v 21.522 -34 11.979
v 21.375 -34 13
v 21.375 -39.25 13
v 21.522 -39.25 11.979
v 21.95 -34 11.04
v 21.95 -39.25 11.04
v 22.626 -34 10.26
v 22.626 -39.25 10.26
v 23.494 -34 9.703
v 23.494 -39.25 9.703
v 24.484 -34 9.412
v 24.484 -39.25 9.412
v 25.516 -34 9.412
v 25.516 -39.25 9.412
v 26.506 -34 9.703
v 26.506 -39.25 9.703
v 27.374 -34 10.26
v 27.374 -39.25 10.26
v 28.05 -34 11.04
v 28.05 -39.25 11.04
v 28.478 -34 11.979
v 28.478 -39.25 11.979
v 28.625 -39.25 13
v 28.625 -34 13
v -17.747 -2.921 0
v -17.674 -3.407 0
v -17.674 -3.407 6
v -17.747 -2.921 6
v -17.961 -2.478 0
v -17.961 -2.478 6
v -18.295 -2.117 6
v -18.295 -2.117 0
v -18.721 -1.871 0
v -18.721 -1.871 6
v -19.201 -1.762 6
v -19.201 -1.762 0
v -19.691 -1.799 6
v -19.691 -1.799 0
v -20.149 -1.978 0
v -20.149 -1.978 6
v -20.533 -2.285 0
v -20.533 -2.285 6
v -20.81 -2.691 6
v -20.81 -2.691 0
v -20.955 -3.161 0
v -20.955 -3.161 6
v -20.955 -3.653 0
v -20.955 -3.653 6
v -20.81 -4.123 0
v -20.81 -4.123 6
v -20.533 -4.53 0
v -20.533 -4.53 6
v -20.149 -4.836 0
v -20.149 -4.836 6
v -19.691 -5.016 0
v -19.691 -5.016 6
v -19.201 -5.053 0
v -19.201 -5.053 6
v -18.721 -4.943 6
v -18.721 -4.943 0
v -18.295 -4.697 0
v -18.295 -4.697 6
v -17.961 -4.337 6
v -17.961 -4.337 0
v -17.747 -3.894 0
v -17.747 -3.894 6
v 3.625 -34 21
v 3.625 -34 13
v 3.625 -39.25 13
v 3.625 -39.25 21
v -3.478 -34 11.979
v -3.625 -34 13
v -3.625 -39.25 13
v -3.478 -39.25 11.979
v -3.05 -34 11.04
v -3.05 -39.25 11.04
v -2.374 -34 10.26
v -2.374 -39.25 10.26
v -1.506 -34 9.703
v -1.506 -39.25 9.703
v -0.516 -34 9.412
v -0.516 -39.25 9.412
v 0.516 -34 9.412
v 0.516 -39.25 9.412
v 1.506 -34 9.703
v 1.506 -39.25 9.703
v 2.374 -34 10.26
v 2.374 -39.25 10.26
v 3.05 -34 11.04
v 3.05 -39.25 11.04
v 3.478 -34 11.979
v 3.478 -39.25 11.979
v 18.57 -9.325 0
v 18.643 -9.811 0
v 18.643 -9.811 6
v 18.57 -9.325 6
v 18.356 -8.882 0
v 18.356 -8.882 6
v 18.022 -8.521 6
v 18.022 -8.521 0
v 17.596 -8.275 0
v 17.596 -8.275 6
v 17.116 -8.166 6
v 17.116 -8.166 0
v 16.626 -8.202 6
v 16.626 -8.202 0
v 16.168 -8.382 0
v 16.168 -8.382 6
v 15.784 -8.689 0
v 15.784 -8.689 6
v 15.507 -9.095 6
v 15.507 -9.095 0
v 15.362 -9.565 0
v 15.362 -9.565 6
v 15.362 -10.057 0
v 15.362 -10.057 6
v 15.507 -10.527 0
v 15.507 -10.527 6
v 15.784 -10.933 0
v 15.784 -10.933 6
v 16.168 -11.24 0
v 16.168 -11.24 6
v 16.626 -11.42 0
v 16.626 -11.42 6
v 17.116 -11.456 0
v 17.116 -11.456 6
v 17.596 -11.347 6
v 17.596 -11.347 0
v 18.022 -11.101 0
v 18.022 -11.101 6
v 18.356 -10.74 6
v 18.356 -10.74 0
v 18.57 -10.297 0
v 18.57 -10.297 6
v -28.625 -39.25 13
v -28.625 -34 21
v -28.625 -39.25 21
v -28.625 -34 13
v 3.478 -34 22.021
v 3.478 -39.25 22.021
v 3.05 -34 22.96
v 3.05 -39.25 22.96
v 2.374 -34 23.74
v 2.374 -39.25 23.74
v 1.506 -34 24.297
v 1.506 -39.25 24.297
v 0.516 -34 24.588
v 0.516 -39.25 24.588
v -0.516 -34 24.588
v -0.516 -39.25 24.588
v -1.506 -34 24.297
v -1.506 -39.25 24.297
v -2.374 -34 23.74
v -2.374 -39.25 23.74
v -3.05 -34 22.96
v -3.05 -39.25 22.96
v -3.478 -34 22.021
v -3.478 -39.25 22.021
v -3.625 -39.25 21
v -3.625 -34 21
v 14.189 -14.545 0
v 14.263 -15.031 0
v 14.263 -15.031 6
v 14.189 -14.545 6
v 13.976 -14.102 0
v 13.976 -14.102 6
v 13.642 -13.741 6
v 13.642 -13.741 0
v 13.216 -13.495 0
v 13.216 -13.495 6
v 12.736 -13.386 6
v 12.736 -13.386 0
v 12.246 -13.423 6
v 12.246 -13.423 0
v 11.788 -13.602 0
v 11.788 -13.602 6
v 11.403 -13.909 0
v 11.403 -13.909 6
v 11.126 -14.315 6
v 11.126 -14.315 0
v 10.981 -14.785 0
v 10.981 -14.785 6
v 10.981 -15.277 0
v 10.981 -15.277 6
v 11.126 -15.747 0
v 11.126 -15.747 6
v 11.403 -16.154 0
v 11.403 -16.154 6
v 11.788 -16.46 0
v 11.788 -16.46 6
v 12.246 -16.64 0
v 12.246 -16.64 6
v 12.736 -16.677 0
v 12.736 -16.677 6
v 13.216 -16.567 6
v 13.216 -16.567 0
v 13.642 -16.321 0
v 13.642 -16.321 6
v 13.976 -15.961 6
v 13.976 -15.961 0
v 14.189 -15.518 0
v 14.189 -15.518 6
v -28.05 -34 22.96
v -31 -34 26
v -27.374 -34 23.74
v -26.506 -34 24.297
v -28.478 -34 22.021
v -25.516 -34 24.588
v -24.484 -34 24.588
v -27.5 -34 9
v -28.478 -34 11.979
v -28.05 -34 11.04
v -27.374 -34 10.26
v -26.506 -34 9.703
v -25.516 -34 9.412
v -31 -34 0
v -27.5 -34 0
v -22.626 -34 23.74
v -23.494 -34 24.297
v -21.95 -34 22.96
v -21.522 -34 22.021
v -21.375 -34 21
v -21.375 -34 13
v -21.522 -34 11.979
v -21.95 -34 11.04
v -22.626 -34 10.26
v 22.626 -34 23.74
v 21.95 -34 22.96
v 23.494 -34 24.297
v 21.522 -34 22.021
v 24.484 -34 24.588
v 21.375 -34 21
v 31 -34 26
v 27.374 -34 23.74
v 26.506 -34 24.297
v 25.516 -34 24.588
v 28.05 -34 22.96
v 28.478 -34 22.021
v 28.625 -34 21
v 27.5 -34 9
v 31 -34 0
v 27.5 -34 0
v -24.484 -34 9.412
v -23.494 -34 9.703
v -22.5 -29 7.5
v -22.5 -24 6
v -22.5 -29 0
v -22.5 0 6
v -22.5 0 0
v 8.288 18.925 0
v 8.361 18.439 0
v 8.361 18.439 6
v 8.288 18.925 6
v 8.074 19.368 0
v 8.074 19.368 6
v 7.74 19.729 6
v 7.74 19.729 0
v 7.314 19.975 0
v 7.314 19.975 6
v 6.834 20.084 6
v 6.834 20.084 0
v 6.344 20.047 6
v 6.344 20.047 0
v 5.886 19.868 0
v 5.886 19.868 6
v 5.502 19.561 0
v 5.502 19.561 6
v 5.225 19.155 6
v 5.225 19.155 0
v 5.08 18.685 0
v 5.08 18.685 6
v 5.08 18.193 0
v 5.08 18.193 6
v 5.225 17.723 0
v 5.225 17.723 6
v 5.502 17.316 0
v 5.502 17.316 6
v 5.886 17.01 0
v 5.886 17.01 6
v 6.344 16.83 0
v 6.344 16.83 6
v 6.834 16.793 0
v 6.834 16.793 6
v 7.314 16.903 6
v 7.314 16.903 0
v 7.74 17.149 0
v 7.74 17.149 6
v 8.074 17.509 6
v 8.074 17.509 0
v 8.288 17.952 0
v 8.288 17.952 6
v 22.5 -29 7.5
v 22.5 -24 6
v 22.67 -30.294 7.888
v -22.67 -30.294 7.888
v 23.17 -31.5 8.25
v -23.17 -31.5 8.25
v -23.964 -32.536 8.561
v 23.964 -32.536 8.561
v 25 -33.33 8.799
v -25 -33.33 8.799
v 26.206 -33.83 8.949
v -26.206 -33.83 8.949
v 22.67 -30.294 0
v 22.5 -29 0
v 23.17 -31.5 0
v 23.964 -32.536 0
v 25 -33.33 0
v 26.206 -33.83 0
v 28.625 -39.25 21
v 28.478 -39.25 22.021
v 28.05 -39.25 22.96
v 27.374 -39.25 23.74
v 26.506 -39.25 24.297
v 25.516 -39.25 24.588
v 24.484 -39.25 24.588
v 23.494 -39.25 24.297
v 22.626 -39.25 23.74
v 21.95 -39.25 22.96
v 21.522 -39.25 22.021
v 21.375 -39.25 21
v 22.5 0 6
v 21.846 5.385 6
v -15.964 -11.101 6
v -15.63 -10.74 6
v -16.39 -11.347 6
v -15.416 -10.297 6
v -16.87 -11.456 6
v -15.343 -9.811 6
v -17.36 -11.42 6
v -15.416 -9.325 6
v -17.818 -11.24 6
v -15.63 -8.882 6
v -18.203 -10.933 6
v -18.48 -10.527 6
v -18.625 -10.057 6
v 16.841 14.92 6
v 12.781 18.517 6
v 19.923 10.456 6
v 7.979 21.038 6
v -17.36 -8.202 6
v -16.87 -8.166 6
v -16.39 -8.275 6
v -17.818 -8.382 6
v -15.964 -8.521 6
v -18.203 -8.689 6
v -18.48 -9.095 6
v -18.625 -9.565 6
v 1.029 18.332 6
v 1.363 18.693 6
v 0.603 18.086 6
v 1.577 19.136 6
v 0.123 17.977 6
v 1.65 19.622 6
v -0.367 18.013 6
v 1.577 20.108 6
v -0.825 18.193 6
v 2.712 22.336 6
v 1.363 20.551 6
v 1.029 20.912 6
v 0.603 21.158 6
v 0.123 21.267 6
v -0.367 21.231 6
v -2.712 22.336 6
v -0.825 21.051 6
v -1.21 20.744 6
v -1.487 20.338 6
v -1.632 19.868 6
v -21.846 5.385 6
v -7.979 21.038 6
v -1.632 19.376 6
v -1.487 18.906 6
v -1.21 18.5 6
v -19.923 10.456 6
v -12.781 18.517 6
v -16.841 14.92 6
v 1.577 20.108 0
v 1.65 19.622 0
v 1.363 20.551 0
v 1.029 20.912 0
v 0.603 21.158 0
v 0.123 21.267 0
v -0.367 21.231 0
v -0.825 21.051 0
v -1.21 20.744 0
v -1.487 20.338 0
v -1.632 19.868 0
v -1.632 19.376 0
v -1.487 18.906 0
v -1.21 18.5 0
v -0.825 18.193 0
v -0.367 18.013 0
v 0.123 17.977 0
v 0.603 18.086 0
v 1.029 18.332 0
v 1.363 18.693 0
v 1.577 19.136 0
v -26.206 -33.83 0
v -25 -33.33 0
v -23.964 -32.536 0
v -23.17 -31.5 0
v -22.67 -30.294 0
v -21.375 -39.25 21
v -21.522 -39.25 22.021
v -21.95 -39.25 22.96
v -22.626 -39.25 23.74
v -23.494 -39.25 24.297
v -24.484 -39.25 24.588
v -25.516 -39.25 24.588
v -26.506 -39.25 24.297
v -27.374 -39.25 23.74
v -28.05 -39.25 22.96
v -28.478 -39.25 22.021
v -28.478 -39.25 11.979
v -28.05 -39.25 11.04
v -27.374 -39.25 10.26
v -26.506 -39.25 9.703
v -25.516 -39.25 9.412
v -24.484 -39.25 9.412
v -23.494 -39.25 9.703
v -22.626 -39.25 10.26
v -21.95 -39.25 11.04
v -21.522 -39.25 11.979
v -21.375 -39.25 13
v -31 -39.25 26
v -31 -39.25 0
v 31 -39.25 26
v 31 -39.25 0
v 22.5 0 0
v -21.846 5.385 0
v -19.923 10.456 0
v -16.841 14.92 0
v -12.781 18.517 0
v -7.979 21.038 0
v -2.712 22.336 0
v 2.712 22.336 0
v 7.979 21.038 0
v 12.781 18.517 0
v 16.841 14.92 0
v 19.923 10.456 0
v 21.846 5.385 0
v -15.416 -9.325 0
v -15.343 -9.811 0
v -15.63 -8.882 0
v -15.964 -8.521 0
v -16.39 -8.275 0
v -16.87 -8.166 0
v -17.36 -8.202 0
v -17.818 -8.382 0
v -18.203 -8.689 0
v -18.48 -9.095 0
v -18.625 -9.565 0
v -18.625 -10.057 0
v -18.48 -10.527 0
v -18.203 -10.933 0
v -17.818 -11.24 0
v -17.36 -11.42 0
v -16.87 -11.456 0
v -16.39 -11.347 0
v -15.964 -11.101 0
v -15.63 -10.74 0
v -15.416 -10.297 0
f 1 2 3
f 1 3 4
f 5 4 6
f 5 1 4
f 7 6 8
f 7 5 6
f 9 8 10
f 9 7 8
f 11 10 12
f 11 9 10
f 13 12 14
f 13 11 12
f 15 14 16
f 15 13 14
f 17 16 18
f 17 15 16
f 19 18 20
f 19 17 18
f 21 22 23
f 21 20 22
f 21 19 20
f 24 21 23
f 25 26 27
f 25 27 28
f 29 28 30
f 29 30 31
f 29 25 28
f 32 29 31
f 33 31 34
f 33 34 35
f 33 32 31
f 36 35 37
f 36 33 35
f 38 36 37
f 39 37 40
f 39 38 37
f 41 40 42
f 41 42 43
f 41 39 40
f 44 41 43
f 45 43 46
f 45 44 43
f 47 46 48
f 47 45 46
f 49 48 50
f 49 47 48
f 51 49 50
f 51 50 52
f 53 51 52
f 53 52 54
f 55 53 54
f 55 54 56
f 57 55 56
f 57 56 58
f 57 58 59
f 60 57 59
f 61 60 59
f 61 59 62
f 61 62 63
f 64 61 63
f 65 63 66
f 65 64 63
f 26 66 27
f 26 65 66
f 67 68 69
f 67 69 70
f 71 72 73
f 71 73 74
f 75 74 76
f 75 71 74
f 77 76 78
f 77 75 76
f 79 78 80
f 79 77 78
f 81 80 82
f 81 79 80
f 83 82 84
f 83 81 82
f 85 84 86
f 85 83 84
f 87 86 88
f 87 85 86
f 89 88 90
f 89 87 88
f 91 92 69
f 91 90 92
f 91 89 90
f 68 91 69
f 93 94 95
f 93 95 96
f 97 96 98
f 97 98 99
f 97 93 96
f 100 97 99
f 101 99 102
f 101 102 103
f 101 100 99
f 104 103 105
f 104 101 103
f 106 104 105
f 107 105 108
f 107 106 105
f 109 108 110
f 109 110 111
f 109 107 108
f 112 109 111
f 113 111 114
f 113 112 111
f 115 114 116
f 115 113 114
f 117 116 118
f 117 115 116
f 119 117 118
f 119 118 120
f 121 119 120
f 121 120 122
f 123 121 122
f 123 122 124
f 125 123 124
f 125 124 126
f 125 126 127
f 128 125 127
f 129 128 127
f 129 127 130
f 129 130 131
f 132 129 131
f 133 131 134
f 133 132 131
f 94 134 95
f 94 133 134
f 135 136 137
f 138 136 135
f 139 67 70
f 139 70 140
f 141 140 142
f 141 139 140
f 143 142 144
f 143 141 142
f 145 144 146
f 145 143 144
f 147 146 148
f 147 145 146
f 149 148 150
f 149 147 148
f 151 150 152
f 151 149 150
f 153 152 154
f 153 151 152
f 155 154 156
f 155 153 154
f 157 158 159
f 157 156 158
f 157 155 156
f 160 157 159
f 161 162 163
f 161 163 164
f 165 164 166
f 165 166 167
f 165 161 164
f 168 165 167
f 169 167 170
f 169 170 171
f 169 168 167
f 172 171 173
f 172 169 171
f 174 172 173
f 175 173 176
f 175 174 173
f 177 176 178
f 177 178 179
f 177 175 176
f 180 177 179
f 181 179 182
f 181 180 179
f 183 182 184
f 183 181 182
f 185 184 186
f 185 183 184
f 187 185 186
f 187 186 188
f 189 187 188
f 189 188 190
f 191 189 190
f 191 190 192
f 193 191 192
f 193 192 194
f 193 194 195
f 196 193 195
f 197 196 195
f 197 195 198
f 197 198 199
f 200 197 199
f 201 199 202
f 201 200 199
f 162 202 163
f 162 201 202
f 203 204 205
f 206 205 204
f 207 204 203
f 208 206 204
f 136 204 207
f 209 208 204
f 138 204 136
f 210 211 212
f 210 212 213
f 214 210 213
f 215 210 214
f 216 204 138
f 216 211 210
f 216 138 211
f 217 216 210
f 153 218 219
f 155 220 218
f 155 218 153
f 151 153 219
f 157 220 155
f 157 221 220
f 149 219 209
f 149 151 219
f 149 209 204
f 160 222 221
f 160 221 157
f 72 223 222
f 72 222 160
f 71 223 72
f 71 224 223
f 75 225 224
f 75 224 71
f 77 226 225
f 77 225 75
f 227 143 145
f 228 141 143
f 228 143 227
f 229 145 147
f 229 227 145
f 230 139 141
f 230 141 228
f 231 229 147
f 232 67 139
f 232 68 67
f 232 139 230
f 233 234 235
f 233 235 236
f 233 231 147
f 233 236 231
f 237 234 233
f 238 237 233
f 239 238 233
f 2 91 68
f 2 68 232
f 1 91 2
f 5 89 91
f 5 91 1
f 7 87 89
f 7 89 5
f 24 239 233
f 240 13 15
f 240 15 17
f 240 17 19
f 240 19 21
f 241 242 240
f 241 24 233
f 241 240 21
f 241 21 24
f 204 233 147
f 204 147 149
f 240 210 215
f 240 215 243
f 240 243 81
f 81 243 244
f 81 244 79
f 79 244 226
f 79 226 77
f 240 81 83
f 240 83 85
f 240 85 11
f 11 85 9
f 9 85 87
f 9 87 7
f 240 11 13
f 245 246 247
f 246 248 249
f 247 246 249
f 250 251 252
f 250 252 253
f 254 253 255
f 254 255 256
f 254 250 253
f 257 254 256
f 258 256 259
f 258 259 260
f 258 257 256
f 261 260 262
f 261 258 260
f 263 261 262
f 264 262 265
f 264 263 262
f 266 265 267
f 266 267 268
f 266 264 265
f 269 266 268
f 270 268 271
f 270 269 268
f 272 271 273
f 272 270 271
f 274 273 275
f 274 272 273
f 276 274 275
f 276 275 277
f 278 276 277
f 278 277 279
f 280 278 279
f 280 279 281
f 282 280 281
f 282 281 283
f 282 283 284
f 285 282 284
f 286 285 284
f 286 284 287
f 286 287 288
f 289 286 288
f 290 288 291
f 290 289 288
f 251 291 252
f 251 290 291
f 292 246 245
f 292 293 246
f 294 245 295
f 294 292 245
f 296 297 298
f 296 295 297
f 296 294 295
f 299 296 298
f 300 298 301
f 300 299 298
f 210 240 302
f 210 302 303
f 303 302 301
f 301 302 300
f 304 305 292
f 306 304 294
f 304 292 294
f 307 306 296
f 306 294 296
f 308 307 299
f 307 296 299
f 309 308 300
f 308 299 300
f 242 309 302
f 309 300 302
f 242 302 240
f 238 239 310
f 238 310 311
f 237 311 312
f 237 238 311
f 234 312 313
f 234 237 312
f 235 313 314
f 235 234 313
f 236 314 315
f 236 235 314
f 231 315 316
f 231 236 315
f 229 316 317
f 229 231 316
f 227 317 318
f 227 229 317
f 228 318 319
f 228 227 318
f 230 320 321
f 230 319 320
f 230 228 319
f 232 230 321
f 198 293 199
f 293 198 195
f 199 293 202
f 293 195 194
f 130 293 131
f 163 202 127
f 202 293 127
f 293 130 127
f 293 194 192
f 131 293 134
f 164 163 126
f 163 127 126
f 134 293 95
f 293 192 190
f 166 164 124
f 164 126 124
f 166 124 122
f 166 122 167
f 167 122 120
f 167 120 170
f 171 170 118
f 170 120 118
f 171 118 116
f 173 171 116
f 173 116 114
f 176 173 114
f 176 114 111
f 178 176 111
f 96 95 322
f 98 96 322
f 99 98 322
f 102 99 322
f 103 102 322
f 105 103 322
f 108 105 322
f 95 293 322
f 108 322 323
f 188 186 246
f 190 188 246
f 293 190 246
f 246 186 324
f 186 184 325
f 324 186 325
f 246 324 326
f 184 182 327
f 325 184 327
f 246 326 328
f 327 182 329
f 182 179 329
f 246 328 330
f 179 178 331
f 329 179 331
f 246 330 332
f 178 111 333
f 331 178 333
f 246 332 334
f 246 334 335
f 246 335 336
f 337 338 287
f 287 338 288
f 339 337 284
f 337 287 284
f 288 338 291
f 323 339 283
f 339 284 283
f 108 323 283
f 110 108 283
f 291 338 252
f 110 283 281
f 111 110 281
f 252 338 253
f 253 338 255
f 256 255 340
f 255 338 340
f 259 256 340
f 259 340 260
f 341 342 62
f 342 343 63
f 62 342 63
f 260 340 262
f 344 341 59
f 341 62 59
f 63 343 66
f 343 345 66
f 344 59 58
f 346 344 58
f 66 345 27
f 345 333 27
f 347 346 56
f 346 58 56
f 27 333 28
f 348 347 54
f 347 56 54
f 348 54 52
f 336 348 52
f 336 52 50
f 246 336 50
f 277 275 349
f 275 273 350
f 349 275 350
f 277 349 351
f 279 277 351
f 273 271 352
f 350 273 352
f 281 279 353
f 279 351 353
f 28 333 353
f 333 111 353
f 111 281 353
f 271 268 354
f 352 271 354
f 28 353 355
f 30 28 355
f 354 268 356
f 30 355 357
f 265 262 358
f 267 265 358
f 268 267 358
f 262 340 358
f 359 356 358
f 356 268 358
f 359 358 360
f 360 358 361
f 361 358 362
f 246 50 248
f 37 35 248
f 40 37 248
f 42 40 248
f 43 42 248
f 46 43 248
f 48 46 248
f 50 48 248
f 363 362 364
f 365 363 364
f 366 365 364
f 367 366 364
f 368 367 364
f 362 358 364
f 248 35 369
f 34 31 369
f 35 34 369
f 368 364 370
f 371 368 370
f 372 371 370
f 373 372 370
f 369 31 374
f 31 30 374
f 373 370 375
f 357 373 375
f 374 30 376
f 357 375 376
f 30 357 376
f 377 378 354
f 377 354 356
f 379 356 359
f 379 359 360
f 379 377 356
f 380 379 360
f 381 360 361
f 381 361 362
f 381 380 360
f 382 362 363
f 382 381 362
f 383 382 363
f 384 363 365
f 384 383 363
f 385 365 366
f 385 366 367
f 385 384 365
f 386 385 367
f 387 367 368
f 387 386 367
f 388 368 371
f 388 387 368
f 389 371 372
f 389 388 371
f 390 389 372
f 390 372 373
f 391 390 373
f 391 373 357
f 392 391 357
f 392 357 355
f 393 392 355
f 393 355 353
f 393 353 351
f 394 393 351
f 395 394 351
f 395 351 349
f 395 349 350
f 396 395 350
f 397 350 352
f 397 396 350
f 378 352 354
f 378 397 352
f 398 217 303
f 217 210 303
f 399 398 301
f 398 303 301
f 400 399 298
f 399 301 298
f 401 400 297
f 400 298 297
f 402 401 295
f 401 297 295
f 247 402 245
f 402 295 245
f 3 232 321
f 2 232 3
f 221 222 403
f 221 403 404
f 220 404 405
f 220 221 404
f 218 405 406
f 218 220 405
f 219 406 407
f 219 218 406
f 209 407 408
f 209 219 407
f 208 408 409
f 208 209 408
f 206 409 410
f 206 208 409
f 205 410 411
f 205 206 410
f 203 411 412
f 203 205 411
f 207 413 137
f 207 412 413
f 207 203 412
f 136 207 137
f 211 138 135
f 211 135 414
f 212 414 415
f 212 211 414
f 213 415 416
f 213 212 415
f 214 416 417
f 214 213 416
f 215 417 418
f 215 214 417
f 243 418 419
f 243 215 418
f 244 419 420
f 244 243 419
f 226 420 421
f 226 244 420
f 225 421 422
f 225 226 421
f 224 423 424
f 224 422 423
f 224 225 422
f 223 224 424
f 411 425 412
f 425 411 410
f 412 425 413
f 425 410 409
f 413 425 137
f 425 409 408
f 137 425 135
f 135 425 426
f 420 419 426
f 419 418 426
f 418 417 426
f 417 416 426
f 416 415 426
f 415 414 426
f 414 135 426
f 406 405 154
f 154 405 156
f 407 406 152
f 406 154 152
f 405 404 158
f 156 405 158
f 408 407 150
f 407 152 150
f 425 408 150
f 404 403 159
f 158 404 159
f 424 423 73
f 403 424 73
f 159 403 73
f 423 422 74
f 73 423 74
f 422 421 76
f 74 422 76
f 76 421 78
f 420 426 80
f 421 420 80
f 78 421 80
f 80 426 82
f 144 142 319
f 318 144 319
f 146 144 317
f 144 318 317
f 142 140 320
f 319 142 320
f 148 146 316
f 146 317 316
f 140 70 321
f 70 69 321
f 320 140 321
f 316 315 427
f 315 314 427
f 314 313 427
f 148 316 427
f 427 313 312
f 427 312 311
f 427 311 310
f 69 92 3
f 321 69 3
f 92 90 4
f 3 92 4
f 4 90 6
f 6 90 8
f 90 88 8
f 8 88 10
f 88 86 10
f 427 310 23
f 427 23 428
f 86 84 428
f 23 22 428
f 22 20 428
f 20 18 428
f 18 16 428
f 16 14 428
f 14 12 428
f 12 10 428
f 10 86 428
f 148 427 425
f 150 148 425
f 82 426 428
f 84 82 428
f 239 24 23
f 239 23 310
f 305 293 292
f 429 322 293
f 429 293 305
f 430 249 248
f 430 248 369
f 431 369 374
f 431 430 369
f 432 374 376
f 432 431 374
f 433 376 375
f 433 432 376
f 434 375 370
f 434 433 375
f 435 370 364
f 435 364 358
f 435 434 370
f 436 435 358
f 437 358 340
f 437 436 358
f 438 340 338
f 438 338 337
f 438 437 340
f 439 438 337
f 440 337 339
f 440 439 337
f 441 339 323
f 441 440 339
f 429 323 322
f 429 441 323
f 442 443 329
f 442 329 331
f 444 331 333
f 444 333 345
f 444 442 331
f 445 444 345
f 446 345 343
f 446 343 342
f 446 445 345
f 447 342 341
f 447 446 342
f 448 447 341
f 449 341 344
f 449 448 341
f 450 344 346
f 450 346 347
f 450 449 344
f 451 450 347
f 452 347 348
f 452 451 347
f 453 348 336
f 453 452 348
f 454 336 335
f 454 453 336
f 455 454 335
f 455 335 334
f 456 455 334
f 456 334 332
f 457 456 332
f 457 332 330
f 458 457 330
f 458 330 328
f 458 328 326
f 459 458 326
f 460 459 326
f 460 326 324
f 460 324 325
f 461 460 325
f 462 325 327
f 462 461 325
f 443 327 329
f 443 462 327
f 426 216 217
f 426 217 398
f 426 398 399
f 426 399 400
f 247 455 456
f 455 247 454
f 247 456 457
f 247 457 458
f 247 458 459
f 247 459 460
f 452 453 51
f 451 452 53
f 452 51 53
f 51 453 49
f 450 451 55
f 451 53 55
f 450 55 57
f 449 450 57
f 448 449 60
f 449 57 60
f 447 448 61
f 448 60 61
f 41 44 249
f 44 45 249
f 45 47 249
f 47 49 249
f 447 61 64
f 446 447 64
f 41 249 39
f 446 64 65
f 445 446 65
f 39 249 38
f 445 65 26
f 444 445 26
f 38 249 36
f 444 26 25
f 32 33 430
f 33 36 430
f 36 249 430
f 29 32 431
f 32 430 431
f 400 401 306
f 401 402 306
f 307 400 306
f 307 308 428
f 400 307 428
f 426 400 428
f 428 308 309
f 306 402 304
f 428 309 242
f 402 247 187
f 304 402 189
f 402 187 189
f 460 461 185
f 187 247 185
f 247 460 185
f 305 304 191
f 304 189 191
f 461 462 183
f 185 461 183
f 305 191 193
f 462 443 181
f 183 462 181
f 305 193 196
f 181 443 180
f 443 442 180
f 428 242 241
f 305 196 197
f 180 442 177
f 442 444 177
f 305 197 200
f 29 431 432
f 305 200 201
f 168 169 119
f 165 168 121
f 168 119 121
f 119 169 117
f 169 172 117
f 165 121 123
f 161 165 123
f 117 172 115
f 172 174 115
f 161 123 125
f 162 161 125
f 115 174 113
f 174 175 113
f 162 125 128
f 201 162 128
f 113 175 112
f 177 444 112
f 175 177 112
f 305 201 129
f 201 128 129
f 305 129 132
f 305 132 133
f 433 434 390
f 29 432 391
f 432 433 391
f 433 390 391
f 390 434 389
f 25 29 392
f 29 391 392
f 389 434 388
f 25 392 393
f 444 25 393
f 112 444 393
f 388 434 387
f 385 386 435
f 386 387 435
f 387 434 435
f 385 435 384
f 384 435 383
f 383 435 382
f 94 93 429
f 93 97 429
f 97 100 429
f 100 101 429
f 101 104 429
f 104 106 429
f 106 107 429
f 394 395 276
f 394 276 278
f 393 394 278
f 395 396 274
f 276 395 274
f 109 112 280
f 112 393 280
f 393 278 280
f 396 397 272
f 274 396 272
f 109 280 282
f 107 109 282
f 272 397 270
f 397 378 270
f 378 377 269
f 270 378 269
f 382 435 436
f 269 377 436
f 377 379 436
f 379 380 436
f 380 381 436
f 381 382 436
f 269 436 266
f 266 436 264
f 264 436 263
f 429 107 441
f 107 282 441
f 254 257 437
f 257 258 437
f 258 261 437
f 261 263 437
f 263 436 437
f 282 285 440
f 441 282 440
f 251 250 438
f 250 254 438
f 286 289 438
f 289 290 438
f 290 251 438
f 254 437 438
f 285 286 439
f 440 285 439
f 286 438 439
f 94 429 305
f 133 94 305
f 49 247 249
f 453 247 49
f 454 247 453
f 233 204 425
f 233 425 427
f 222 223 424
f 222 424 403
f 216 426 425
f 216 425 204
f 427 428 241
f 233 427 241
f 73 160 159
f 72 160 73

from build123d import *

# Parameters (mm, degrees)
SKETCH_1_R          = 1.65
EXTRUDE_1_DEPTH     = 6
SKETCH_2_W          = 62
SKETCH_2_H          = 5.25
EXTRUDE_2_DEPTH     = 26
CUT_EXTRUDE_1_DEPTH = 70.492805383
EXTRUDE_3_DEPTH     = 22.5
FILLET_1_R          = 5


with BuildPart() as part:
    # 스케치1 → 보스-돌출1 (new body)
    with BuildSketch(Plane.XY):
        with BuildLine():
            ThreePointArc((-22.5, 0), (0, 22.5), (22.5, 0))
            Line((22.5, 0), (22.5, -34))
            Line((22.5, -34), (-22.5, -34))
            Line((-22.5, -34), (-22.5, 0))
        make_face()
        with Locations((-19.32389773, -3.407324542)):
            Circle(SKETCH_1_R, mode=Mode.SUBTRACT)
        with Locations((16.993150473, -9.811)):
            Circle(SKETCH_1_R, mode=Mode.SUBTRACT)
        with Locations((6.711119252, 18.438648605)):
            Circle(SKETCH_1_R, mode=Mode.SUBTRACT)
        with Locations((0, 19.622)):
            Circle(SKETCH_1_R, mode=Mode.SUBTRACT)
        with Locations((12.612778477, -15.031324063)):
            Circle(SKETCH_1_R, mode=Mode.SUBTRACT)
        with Locations((-16.993150473, -9.811)):
            Circle(SKETCH_1_R, mode=Mode.SUBTRACT)
    extrude(amount=EXTRUDE_1_DEPTH)

    # 스케치2 → 보스-돌출2 (add)
    with BuildSketch(Plane.XY):
        with Locations((0, -36.625)):
            Rectangle(SKETCH_2_W, SKETCH_2_H)
    extrude(amount=EXTRUDE_2_DEPTH)

    # 스케치3 → 컷-돌출1 (cut, through all)
    with BuildSketch(Plane(origin=(0, -34, 0), x_dir=(1, 0, 0), z_dir=(0, 1, 0))):
        with BuildLine():
            Line((-3.625, -21), (-3.625, -13))
            ThreePointArc((-3.625, -13), (0, -9.375), (3.625, -13))
            Line((3.625, -13), (3.625, -21))
            ThreePointArc((3.625, -21), (0, -24.625), (-3.625, -21))
        make_face()
        with BuildLine():
            Line((21.375, -21), (21.375, -13))
            ThreePointArc((21.375, -13), (25, -9.375), (28.625, -13))
            Line((28.625, -13), (28.625, -21))
            ThreePointArc((28.625, -21), (25, -24.625), (21.375, -21))
        make_face()
        with BuildLine():
            Line((-28.625, -21), (-28.625, -13))
            ThreePointArc((-28.625, -13), (-25, -9.375), (-21.375, -13))
            Line((-21.375, -13), (-21.375, -21))
            ThreePointArc((-21.375, -21), (-25, -24.625), (-28.625, -21))
        make_face()
    extrude(amount=-CUT_EXTRUDE_1_DEPTH, mode=Mode.SUBTRACT)

    # 스케치4 → 보스-돌출3 (add, symmetric)
    with BuildSketch(Plane(origin=(0, 0, 0), x_dir=(0, 0, -1), z_dir=(1, 0, 0))):
        Polygon((-6, -24), (-9, -34), (-6, -34), align=None)
    extrude(amount=EXTRUDE_3_DEPTH, both=True)

    # 필렛1
    fillet_1_edges = [part.edges().sort_by_distance(p)[0] for p in [
        (22.5, -34, 4.5),
        (-22.5, -34, 4.5),
    ]]
    fillet(fillet_1_edges, radius=FILLET_1_R)


solid = part.part
